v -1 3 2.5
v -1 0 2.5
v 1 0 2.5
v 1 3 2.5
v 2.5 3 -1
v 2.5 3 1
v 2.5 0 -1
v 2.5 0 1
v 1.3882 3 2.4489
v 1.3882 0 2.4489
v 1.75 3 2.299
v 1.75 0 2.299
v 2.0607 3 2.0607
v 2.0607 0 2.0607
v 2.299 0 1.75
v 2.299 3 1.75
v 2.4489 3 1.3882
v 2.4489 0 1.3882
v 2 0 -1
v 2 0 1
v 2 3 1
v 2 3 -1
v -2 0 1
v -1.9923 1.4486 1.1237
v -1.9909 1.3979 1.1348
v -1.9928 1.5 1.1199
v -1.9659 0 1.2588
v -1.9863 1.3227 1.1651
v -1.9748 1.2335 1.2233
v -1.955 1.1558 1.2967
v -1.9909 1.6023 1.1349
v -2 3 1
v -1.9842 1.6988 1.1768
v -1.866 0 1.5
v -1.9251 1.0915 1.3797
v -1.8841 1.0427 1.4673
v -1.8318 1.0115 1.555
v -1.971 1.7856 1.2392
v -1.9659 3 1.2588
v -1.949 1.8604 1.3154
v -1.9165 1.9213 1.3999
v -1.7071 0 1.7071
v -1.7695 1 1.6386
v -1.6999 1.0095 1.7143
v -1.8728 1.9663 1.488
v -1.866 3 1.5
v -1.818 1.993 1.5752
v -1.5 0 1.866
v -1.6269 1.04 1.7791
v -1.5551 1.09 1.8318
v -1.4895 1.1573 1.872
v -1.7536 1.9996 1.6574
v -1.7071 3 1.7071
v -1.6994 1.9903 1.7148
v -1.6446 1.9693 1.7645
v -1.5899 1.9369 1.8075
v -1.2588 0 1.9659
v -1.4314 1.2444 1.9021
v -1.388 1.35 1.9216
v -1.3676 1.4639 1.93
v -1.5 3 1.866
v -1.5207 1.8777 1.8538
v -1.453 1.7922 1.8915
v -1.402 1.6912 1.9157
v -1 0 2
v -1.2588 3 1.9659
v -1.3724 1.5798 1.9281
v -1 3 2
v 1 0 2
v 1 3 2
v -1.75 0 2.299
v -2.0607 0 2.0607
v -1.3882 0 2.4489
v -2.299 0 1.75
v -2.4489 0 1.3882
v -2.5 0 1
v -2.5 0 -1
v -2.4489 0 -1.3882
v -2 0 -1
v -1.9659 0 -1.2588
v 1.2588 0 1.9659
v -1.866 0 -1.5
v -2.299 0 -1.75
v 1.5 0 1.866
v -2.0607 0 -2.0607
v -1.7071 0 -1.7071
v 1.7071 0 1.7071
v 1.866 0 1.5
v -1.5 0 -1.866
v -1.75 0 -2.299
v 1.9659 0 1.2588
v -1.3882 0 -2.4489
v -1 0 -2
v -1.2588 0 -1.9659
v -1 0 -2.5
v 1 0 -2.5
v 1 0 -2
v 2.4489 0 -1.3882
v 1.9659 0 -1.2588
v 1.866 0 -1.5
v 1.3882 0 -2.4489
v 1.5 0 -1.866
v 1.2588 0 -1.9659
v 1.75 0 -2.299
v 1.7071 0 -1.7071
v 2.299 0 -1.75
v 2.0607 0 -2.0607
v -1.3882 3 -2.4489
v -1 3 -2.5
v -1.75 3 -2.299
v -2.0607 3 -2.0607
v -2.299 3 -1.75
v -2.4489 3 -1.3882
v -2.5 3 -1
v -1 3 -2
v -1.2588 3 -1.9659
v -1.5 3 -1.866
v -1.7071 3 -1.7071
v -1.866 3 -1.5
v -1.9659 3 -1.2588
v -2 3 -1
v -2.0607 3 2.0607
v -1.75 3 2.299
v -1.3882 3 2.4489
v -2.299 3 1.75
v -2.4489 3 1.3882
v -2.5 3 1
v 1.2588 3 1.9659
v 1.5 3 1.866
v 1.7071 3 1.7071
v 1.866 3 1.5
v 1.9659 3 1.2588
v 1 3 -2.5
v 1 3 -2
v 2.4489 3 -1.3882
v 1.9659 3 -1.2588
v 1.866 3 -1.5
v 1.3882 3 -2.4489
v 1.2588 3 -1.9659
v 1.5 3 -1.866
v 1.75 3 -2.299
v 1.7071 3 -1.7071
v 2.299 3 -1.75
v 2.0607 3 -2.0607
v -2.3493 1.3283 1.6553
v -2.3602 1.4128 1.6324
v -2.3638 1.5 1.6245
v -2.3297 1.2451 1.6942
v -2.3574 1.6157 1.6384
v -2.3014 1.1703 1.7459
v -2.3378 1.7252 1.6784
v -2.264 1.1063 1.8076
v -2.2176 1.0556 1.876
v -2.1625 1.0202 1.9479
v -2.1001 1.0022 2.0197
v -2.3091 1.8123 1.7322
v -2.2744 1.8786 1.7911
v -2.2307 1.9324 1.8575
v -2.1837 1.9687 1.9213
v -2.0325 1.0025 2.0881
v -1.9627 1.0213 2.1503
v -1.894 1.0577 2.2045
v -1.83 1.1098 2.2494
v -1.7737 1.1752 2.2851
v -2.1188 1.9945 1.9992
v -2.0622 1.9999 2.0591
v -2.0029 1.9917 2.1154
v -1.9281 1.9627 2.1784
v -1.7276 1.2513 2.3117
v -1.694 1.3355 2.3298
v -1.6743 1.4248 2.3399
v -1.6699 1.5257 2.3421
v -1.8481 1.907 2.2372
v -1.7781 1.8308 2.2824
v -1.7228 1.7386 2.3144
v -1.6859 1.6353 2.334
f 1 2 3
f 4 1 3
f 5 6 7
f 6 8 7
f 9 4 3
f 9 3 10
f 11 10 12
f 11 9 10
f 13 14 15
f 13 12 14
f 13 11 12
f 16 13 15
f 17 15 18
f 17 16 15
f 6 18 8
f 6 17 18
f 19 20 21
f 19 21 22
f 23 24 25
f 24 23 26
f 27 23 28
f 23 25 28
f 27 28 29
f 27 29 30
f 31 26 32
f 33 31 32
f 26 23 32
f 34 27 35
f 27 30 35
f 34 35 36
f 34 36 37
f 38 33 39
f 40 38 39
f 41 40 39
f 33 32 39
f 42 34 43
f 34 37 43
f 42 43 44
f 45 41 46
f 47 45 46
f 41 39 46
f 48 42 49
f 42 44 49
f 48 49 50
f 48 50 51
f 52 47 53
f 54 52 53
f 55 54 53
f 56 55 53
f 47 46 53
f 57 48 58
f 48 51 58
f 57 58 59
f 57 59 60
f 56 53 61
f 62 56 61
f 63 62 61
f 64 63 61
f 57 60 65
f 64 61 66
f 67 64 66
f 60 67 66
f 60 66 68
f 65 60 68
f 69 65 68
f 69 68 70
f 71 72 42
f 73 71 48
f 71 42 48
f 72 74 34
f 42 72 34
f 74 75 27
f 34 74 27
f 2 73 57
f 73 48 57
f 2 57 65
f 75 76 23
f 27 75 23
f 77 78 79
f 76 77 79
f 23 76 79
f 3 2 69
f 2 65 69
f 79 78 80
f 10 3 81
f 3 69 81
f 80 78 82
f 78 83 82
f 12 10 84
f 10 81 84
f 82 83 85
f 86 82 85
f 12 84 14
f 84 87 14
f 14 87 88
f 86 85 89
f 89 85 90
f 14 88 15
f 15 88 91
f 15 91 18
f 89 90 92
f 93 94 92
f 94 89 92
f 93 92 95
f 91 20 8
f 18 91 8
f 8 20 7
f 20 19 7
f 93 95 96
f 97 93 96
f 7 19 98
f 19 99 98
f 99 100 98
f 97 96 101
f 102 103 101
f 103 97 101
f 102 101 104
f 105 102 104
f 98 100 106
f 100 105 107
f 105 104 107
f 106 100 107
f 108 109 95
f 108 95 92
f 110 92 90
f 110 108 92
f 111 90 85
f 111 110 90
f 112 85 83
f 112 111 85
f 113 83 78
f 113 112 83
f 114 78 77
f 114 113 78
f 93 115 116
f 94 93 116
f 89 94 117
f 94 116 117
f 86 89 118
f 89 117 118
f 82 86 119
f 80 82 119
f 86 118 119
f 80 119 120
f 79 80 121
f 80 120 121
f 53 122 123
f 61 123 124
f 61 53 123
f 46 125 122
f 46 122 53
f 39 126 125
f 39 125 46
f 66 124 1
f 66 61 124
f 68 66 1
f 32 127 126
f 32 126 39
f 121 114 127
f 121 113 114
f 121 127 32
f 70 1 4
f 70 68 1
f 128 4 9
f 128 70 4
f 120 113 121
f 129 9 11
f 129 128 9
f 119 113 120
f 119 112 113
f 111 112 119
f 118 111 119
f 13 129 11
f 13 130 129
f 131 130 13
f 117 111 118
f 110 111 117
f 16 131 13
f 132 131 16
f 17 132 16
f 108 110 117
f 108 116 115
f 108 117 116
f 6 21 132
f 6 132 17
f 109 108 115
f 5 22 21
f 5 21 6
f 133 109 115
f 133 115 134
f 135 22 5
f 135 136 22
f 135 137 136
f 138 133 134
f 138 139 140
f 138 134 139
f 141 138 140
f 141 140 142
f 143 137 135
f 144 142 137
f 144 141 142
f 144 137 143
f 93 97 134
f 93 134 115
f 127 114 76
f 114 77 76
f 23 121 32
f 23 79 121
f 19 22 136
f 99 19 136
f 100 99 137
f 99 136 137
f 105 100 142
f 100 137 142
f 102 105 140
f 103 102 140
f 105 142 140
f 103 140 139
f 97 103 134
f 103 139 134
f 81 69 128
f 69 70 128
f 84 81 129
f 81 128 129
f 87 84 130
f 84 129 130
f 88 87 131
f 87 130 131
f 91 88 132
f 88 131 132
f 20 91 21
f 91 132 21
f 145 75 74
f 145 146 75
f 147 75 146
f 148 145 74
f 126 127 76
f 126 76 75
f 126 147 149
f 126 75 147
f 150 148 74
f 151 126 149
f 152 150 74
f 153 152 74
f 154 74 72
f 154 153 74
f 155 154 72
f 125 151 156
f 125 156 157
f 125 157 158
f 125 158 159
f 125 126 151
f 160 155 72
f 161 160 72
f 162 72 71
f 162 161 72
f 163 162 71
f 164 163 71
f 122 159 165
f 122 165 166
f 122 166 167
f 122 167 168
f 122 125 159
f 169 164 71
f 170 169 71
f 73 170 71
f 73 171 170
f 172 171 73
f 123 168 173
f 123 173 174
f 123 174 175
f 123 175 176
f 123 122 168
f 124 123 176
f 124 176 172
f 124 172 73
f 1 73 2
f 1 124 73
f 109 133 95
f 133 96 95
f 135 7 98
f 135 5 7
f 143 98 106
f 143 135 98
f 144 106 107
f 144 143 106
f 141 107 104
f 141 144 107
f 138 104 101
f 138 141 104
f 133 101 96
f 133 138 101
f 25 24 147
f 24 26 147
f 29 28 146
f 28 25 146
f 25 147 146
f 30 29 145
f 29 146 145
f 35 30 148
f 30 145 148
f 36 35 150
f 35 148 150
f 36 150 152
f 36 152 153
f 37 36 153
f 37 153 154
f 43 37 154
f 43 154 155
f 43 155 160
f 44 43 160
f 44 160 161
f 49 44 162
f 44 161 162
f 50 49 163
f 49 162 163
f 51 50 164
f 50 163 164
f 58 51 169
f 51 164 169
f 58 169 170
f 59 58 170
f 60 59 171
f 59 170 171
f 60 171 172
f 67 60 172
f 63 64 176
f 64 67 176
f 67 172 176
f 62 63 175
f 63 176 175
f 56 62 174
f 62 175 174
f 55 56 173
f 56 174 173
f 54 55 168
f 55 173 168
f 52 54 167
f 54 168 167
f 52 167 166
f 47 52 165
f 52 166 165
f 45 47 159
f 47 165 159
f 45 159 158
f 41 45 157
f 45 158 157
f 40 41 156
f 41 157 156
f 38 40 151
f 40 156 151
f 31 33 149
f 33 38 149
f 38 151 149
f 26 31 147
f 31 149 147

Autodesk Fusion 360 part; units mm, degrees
sketch "Sketch1" plane through (0, 0, 0) normal (0, 1, 0) x (1, 0, 0)
  line L0 (-2, -2) -> (2, -2)
  line L1 (2, -2) -> (2, 2)
  line L2 (2, 2) -> (-2, 2)
  line L3 (-2, 2) -> (-2, -2)
  line L4 (-2, -2) -> (2, 2) construction
  line L5 (2, -2) -> (-2, 2) construction
  line L6 (-2.5, -2.5) -> (2.5, -2.5)
  line L7 (2.5, -2.5) -> (2.5, 2.5)
  line L8 (2.5, 2.5) -> (-2.5, 2.5)
  line L9 (-2.5, 2.5) -> (-2.5, -2.5)
  line L10 (-2.5, -2.5) -> (2.5, 2.5) construction
  line L11 (2.5, -2.5) -> (-2.5, 2.5) construction
  dimension "d1" = 4
  dimension "d2" = 4
  dimension "d3" = 5
  dimension "d4" = 5
extrude "Extrude1" add sketch "Sketch1" along normal blind 3
fillet "Fillet1" radius 1.5 4 edges at (-2.5, 1.5, -2.5) (-2.5, 1.5, 2.5) (2.5, 1.5, -2.5) (2.5, 1.5, 2.5)
fillet "Fillet2" radius 1 4 edges at (-2, 1.5, -2) (-2, 1.5, 2) (2, 1.5, 2) (2, 1.5, -2)
sketch "Sketch2" plane through (0, 0, 2.5) normal (0, 0, 1) x (1, 0, 0)
  line L0 (1, 0) -> (1, 3)
  line L1 (1, 3) -> (-1, 3)
  line L2 (-1, 3) -> (-1, 0)
  line L3 (-1, 0) -> (1, 0)
ref_plane "WorkPlane1" through (-2.0849, 2.8811, 2.0359) normal (-0.72326, 0, 0.690576) x (-0.690576, 0, -0.72326)
sketch "Sketch3" plane through (-2.0849, 2.8811, 2.0359) normal (-0.72326, 0, 0.690576) x (-0.690576, 0, -0.72326)
  circle A0 centre (-0.0244, 1.3811) radius 0.5
  line L0 (1.0359, -0.1189) -> (-1.0849, -0.1189)
  line L1 (-1.0849, -0.1189) -> (-1.0849, 2.8811)
  line L2 (1.0359, -0.1189) -> (1.0359, 2.8811)
  dimension "d10" = 1
  dimension "d11" = 1.5
  dimension "d14" = 1.0605
  dimension "d15" = 1.097
extrude "Extrude2" cut sketch "Sketch3" against normal blind 0.9
